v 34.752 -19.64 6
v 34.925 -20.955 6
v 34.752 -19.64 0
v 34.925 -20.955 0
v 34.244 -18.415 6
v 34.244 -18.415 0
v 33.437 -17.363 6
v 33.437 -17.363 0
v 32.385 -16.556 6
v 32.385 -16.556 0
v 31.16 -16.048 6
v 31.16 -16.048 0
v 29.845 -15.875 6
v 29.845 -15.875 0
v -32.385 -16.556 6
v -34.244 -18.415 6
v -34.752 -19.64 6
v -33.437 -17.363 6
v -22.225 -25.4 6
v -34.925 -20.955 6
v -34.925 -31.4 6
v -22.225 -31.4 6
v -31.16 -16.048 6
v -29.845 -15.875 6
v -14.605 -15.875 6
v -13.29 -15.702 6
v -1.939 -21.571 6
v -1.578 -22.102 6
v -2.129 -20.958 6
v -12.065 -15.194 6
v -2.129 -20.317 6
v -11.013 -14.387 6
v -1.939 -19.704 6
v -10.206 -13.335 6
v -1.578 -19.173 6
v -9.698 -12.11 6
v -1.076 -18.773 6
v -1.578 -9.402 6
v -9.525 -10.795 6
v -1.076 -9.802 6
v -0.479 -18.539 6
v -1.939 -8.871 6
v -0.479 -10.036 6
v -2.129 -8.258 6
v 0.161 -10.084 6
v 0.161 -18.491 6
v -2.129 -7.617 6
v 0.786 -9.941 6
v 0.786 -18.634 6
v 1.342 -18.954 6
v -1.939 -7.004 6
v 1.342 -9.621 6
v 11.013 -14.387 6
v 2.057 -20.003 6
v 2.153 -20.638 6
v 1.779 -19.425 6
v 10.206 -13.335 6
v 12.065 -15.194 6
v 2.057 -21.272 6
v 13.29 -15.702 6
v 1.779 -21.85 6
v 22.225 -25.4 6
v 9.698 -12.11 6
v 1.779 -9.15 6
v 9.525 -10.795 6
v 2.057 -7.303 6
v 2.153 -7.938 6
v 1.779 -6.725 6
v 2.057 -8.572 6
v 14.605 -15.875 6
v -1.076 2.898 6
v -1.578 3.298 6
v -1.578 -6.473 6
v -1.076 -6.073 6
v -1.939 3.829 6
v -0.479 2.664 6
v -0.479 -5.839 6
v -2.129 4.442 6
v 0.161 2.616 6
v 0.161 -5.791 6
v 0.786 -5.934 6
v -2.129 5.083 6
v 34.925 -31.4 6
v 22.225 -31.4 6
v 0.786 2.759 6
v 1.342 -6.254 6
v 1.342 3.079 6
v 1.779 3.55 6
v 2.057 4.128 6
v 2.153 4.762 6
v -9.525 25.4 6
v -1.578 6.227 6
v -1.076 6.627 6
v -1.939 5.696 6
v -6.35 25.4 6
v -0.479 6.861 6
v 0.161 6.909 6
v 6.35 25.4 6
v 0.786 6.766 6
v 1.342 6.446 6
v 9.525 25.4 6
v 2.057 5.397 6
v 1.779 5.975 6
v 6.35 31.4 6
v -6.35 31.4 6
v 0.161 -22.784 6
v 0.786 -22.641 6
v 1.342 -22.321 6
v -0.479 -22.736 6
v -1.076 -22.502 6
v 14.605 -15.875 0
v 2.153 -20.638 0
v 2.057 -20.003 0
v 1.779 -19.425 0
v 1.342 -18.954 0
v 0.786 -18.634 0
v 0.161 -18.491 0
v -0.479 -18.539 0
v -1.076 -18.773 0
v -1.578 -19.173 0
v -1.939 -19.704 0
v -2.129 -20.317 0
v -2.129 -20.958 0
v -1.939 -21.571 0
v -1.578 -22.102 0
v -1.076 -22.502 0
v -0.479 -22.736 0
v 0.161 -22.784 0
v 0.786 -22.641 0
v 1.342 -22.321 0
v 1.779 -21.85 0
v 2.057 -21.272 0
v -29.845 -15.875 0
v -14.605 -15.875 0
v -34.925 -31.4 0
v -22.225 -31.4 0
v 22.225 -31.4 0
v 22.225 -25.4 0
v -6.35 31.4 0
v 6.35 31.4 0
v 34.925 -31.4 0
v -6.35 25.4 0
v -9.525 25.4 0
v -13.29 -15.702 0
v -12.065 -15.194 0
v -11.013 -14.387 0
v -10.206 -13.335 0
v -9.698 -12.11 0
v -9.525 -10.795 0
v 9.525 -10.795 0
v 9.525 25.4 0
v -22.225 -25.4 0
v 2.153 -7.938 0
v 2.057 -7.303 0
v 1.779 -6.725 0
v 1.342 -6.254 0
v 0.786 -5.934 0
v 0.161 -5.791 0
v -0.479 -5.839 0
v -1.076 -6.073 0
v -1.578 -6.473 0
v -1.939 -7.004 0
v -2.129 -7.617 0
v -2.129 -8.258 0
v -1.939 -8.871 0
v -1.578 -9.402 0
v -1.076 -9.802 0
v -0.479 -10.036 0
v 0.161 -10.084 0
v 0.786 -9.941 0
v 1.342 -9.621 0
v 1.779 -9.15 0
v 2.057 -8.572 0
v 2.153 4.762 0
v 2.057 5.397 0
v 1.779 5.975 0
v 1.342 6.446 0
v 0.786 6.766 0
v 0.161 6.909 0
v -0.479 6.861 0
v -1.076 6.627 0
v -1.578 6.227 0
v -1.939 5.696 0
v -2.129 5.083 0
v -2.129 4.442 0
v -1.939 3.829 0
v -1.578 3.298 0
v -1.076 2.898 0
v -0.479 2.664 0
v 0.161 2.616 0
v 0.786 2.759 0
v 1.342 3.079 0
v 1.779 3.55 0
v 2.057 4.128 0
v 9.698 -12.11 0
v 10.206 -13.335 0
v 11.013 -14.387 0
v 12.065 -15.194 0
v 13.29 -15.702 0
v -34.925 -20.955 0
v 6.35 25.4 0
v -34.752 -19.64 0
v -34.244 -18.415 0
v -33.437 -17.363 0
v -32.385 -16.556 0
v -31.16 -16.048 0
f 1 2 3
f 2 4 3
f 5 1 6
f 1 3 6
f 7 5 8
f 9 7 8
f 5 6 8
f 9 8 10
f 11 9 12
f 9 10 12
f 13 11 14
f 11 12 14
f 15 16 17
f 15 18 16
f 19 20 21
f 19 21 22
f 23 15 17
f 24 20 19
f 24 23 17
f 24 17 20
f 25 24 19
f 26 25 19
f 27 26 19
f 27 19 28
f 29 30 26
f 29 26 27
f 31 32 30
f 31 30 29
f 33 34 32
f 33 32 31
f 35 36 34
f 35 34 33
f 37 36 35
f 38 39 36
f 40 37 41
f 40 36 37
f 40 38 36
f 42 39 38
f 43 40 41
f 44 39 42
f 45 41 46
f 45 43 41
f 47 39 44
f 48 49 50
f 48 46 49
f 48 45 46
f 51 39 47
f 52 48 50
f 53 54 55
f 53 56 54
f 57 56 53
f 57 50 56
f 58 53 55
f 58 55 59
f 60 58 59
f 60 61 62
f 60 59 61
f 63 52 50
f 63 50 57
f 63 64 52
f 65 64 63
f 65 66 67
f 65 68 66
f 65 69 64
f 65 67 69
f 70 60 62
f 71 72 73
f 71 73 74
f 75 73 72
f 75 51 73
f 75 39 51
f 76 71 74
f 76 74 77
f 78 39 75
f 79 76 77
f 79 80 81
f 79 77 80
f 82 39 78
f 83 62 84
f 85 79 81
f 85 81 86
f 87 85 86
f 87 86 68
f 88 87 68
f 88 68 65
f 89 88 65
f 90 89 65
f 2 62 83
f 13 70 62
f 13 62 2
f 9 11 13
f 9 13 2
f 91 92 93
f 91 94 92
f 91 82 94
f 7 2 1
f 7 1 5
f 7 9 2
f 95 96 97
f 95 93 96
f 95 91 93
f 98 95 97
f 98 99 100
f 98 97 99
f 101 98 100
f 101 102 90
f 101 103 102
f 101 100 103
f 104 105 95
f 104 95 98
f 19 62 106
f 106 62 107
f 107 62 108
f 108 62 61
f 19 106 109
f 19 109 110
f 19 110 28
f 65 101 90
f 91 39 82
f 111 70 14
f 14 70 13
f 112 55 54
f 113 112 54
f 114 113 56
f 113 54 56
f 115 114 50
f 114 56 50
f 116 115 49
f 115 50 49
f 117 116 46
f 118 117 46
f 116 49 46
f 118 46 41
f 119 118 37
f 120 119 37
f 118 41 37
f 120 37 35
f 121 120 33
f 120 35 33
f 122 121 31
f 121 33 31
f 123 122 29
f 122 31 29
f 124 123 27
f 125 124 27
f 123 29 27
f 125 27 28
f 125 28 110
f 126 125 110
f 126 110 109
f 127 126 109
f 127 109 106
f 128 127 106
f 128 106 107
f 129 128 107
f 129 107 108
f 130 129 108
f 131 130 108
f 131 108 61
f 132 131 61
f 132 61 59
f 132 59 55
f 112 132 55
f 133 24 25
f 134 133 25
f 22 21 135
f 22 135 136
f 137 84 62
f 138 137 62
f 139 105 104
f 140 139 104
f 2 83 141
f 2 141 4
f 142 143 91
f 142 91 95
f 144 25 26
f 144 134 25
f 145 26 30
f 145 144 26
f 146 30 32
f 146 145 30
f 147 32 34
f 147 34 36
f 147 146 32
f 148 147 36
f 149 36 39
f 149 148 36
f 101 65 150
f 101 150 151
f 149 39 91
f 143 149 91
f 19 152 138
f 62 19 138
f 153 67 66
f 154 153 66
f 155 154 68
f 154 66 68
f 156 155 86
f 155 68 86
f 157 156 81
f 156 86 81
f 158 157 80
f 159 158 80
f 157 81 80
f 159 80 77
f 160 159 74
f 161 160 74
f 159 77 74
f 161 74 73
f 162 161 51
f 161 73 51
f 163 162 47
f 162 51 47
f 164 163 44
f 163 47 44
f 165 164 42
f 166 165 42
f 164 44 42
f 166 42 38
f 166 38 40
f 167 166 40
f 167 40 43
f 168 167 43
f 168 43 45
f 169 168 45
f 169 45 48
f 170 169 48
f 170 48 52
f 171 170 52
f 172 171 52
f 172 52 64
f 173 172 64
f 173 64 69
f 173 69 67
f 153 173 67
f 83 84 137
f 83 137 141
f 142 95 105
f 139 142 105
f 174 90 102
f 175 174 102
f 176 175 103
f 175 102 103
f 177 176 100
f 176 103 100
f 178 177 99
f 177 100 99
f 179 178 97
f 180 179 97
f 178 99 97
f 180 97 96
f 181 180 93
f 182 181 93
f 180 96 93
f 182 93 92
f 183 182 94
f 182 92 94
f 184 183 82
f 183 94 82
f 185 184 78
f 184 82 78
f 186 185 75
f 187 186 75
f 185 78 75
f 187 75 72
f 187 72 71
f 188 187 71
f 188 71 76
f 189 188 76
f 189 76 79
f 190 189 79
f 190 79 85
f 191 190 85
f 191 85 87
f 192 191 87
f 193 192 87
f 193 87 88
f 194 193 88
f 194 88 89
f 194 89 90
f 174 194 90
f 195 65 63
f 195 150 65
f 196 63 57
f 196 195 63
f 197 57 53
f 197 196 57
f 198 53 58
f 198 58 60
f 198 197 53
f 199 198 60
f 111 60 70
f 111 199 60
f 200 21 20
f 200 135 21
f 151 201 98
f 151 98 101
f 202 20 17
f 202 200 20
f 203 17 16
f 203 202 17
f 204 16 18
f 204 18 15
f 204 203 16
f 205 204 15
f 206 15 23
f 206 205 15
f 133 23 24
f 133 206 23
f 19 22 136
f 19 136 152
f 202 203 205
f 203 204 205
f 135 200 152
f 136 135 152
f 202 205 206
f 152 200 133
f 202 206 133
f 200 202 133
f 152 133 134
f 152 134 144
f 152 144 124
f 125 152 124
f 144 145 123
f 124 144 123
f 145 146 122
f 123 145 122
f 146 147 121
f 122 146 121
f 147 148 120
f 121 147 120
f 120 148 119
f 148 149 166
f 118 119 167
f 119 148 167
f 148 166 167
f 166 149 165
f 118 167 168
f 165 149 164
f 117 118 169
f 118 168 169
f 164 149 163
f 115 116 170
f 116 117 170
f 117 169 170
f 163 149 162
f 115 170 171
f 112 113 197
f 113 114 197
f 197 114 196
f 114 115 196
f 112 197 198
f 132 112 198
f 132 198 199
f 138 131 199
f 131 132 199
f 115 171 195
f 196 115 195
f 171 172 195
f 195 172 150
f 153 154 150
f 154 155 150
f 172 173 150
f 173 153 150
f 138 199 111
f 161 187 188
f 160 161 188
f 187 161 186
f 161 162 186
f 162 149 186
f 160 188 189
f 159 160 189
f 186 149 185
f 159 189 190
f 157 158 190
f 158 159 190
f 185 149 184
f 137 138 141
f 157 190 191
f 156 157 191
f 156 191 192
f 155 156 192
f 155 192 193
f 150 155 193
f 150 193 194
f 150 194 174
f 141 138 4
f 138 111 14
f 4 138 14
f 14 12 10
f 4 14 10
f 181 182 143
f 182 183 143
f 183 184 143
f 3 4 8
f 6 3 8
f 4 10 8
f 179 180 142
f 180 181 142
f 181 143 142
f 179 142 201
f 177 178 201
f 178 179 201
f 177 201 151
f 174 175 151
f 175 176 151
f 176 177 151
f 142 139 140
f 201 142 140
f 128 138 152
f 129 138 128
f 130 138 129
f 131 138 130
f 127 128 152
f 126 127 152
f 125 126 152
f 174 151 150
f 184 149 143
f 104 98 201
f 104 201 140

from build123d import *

# Parameters (mm, degrees)
SKETCH1_W             = 69.85
SKETCH1_H             = 50.8
BASE_DEPTH            = 5.999988
SKETCH6_W             = 12.7
SKETCH6_H             = 5.999988
BOSS_EXTRUDE1_DEPTH   = 5.999988
SKETCH7_W             = 25.4
SKETCH7_H             = 41.275
CUT_EXTRUDE1_DEPTH    = 48.346749914
F_8_CLEARANCE_HOLE1_D = 4.3053
SKETCH8_W             = 25.4
SKETCH8_H             = 41.275
CUT_EXTRUDE2_DEPTH    = 48.346749914
FILLET1_R             = 5.08


with BuildPart() as part:
    # Sketch1 → Base (new body)
    with BuildSketch(Plane.XY):
        Rectangle(SKETCH1_W, SKETCH1_H)
    extrude(amount=BASE_DEPTH)

    # Sketch6 → Boss-Extrude1 (add)
    with BuildSketch(Plane.XY.offset(5.999988)):
        with Locations((0, 28.399994)):
            Rectangle(SKETCH6_W, SKETCH6_H)
        with Locations((28.575, -28.399994)):
            Rectangle(SKETCH6_W, SKETCH6_H)
        with Locations((-28.575, -28.399994)):
            Rectangle(SKETCH6_W, SKETCH6_H)
    extrude(amount=-BOSS_EXTRUDE1_DEPTH)

    # Sketch7 → Cut-Extrude1 (cut, through all)
    with BuildSketch(Plane.XY.offset(5.999988)):
        with Locations((-22.225, 4.7625)):
            Rectangle(SKETCH7_W, SKETCH7_H)
    extrude(amount=-CUT_EXTRUDE1_DEPTH, mode=Mode.SUBTRACT)

    # #8 Clearance Hole1 (through all)
    with Locations(Plane(origin=(0, 0, 0), x_dir=(-1, 0, 0), z_dir=(0, 0, -1))):
        with Locations((0, -20.6375), (0, -7.9375), (0, 4.7625)):
            Hole(F_8_CLEARANCE_HOLE1_D / 2)

    # Sketch8 → Cut-Extrude2 (cut, through all)
    with BuildSketch(Plane.XY.offset(5.999988)):
        with Locations((22.225, 4.7625)):
            Rectangle(SKETCH8_W, SKETCH8_H)
    extrude(amount=-CUT_EXTRUDE2_DEPTH, mode=Mode.SUBTRACT)

    # Fillet1
    fillet1_edges = [part.edges().sort_by_distance(p)[0] for p in [
        (34.925, -15.875, 2.999994),
        (9.525, -15.875, 2.999994),
        (-9.525, -15.875, 2.999994),
        (-34.925, -15.875, 2.999994),
    ]]
    fillet(fillet1_edges, radius=FILLET1_R)


solid = part.part
